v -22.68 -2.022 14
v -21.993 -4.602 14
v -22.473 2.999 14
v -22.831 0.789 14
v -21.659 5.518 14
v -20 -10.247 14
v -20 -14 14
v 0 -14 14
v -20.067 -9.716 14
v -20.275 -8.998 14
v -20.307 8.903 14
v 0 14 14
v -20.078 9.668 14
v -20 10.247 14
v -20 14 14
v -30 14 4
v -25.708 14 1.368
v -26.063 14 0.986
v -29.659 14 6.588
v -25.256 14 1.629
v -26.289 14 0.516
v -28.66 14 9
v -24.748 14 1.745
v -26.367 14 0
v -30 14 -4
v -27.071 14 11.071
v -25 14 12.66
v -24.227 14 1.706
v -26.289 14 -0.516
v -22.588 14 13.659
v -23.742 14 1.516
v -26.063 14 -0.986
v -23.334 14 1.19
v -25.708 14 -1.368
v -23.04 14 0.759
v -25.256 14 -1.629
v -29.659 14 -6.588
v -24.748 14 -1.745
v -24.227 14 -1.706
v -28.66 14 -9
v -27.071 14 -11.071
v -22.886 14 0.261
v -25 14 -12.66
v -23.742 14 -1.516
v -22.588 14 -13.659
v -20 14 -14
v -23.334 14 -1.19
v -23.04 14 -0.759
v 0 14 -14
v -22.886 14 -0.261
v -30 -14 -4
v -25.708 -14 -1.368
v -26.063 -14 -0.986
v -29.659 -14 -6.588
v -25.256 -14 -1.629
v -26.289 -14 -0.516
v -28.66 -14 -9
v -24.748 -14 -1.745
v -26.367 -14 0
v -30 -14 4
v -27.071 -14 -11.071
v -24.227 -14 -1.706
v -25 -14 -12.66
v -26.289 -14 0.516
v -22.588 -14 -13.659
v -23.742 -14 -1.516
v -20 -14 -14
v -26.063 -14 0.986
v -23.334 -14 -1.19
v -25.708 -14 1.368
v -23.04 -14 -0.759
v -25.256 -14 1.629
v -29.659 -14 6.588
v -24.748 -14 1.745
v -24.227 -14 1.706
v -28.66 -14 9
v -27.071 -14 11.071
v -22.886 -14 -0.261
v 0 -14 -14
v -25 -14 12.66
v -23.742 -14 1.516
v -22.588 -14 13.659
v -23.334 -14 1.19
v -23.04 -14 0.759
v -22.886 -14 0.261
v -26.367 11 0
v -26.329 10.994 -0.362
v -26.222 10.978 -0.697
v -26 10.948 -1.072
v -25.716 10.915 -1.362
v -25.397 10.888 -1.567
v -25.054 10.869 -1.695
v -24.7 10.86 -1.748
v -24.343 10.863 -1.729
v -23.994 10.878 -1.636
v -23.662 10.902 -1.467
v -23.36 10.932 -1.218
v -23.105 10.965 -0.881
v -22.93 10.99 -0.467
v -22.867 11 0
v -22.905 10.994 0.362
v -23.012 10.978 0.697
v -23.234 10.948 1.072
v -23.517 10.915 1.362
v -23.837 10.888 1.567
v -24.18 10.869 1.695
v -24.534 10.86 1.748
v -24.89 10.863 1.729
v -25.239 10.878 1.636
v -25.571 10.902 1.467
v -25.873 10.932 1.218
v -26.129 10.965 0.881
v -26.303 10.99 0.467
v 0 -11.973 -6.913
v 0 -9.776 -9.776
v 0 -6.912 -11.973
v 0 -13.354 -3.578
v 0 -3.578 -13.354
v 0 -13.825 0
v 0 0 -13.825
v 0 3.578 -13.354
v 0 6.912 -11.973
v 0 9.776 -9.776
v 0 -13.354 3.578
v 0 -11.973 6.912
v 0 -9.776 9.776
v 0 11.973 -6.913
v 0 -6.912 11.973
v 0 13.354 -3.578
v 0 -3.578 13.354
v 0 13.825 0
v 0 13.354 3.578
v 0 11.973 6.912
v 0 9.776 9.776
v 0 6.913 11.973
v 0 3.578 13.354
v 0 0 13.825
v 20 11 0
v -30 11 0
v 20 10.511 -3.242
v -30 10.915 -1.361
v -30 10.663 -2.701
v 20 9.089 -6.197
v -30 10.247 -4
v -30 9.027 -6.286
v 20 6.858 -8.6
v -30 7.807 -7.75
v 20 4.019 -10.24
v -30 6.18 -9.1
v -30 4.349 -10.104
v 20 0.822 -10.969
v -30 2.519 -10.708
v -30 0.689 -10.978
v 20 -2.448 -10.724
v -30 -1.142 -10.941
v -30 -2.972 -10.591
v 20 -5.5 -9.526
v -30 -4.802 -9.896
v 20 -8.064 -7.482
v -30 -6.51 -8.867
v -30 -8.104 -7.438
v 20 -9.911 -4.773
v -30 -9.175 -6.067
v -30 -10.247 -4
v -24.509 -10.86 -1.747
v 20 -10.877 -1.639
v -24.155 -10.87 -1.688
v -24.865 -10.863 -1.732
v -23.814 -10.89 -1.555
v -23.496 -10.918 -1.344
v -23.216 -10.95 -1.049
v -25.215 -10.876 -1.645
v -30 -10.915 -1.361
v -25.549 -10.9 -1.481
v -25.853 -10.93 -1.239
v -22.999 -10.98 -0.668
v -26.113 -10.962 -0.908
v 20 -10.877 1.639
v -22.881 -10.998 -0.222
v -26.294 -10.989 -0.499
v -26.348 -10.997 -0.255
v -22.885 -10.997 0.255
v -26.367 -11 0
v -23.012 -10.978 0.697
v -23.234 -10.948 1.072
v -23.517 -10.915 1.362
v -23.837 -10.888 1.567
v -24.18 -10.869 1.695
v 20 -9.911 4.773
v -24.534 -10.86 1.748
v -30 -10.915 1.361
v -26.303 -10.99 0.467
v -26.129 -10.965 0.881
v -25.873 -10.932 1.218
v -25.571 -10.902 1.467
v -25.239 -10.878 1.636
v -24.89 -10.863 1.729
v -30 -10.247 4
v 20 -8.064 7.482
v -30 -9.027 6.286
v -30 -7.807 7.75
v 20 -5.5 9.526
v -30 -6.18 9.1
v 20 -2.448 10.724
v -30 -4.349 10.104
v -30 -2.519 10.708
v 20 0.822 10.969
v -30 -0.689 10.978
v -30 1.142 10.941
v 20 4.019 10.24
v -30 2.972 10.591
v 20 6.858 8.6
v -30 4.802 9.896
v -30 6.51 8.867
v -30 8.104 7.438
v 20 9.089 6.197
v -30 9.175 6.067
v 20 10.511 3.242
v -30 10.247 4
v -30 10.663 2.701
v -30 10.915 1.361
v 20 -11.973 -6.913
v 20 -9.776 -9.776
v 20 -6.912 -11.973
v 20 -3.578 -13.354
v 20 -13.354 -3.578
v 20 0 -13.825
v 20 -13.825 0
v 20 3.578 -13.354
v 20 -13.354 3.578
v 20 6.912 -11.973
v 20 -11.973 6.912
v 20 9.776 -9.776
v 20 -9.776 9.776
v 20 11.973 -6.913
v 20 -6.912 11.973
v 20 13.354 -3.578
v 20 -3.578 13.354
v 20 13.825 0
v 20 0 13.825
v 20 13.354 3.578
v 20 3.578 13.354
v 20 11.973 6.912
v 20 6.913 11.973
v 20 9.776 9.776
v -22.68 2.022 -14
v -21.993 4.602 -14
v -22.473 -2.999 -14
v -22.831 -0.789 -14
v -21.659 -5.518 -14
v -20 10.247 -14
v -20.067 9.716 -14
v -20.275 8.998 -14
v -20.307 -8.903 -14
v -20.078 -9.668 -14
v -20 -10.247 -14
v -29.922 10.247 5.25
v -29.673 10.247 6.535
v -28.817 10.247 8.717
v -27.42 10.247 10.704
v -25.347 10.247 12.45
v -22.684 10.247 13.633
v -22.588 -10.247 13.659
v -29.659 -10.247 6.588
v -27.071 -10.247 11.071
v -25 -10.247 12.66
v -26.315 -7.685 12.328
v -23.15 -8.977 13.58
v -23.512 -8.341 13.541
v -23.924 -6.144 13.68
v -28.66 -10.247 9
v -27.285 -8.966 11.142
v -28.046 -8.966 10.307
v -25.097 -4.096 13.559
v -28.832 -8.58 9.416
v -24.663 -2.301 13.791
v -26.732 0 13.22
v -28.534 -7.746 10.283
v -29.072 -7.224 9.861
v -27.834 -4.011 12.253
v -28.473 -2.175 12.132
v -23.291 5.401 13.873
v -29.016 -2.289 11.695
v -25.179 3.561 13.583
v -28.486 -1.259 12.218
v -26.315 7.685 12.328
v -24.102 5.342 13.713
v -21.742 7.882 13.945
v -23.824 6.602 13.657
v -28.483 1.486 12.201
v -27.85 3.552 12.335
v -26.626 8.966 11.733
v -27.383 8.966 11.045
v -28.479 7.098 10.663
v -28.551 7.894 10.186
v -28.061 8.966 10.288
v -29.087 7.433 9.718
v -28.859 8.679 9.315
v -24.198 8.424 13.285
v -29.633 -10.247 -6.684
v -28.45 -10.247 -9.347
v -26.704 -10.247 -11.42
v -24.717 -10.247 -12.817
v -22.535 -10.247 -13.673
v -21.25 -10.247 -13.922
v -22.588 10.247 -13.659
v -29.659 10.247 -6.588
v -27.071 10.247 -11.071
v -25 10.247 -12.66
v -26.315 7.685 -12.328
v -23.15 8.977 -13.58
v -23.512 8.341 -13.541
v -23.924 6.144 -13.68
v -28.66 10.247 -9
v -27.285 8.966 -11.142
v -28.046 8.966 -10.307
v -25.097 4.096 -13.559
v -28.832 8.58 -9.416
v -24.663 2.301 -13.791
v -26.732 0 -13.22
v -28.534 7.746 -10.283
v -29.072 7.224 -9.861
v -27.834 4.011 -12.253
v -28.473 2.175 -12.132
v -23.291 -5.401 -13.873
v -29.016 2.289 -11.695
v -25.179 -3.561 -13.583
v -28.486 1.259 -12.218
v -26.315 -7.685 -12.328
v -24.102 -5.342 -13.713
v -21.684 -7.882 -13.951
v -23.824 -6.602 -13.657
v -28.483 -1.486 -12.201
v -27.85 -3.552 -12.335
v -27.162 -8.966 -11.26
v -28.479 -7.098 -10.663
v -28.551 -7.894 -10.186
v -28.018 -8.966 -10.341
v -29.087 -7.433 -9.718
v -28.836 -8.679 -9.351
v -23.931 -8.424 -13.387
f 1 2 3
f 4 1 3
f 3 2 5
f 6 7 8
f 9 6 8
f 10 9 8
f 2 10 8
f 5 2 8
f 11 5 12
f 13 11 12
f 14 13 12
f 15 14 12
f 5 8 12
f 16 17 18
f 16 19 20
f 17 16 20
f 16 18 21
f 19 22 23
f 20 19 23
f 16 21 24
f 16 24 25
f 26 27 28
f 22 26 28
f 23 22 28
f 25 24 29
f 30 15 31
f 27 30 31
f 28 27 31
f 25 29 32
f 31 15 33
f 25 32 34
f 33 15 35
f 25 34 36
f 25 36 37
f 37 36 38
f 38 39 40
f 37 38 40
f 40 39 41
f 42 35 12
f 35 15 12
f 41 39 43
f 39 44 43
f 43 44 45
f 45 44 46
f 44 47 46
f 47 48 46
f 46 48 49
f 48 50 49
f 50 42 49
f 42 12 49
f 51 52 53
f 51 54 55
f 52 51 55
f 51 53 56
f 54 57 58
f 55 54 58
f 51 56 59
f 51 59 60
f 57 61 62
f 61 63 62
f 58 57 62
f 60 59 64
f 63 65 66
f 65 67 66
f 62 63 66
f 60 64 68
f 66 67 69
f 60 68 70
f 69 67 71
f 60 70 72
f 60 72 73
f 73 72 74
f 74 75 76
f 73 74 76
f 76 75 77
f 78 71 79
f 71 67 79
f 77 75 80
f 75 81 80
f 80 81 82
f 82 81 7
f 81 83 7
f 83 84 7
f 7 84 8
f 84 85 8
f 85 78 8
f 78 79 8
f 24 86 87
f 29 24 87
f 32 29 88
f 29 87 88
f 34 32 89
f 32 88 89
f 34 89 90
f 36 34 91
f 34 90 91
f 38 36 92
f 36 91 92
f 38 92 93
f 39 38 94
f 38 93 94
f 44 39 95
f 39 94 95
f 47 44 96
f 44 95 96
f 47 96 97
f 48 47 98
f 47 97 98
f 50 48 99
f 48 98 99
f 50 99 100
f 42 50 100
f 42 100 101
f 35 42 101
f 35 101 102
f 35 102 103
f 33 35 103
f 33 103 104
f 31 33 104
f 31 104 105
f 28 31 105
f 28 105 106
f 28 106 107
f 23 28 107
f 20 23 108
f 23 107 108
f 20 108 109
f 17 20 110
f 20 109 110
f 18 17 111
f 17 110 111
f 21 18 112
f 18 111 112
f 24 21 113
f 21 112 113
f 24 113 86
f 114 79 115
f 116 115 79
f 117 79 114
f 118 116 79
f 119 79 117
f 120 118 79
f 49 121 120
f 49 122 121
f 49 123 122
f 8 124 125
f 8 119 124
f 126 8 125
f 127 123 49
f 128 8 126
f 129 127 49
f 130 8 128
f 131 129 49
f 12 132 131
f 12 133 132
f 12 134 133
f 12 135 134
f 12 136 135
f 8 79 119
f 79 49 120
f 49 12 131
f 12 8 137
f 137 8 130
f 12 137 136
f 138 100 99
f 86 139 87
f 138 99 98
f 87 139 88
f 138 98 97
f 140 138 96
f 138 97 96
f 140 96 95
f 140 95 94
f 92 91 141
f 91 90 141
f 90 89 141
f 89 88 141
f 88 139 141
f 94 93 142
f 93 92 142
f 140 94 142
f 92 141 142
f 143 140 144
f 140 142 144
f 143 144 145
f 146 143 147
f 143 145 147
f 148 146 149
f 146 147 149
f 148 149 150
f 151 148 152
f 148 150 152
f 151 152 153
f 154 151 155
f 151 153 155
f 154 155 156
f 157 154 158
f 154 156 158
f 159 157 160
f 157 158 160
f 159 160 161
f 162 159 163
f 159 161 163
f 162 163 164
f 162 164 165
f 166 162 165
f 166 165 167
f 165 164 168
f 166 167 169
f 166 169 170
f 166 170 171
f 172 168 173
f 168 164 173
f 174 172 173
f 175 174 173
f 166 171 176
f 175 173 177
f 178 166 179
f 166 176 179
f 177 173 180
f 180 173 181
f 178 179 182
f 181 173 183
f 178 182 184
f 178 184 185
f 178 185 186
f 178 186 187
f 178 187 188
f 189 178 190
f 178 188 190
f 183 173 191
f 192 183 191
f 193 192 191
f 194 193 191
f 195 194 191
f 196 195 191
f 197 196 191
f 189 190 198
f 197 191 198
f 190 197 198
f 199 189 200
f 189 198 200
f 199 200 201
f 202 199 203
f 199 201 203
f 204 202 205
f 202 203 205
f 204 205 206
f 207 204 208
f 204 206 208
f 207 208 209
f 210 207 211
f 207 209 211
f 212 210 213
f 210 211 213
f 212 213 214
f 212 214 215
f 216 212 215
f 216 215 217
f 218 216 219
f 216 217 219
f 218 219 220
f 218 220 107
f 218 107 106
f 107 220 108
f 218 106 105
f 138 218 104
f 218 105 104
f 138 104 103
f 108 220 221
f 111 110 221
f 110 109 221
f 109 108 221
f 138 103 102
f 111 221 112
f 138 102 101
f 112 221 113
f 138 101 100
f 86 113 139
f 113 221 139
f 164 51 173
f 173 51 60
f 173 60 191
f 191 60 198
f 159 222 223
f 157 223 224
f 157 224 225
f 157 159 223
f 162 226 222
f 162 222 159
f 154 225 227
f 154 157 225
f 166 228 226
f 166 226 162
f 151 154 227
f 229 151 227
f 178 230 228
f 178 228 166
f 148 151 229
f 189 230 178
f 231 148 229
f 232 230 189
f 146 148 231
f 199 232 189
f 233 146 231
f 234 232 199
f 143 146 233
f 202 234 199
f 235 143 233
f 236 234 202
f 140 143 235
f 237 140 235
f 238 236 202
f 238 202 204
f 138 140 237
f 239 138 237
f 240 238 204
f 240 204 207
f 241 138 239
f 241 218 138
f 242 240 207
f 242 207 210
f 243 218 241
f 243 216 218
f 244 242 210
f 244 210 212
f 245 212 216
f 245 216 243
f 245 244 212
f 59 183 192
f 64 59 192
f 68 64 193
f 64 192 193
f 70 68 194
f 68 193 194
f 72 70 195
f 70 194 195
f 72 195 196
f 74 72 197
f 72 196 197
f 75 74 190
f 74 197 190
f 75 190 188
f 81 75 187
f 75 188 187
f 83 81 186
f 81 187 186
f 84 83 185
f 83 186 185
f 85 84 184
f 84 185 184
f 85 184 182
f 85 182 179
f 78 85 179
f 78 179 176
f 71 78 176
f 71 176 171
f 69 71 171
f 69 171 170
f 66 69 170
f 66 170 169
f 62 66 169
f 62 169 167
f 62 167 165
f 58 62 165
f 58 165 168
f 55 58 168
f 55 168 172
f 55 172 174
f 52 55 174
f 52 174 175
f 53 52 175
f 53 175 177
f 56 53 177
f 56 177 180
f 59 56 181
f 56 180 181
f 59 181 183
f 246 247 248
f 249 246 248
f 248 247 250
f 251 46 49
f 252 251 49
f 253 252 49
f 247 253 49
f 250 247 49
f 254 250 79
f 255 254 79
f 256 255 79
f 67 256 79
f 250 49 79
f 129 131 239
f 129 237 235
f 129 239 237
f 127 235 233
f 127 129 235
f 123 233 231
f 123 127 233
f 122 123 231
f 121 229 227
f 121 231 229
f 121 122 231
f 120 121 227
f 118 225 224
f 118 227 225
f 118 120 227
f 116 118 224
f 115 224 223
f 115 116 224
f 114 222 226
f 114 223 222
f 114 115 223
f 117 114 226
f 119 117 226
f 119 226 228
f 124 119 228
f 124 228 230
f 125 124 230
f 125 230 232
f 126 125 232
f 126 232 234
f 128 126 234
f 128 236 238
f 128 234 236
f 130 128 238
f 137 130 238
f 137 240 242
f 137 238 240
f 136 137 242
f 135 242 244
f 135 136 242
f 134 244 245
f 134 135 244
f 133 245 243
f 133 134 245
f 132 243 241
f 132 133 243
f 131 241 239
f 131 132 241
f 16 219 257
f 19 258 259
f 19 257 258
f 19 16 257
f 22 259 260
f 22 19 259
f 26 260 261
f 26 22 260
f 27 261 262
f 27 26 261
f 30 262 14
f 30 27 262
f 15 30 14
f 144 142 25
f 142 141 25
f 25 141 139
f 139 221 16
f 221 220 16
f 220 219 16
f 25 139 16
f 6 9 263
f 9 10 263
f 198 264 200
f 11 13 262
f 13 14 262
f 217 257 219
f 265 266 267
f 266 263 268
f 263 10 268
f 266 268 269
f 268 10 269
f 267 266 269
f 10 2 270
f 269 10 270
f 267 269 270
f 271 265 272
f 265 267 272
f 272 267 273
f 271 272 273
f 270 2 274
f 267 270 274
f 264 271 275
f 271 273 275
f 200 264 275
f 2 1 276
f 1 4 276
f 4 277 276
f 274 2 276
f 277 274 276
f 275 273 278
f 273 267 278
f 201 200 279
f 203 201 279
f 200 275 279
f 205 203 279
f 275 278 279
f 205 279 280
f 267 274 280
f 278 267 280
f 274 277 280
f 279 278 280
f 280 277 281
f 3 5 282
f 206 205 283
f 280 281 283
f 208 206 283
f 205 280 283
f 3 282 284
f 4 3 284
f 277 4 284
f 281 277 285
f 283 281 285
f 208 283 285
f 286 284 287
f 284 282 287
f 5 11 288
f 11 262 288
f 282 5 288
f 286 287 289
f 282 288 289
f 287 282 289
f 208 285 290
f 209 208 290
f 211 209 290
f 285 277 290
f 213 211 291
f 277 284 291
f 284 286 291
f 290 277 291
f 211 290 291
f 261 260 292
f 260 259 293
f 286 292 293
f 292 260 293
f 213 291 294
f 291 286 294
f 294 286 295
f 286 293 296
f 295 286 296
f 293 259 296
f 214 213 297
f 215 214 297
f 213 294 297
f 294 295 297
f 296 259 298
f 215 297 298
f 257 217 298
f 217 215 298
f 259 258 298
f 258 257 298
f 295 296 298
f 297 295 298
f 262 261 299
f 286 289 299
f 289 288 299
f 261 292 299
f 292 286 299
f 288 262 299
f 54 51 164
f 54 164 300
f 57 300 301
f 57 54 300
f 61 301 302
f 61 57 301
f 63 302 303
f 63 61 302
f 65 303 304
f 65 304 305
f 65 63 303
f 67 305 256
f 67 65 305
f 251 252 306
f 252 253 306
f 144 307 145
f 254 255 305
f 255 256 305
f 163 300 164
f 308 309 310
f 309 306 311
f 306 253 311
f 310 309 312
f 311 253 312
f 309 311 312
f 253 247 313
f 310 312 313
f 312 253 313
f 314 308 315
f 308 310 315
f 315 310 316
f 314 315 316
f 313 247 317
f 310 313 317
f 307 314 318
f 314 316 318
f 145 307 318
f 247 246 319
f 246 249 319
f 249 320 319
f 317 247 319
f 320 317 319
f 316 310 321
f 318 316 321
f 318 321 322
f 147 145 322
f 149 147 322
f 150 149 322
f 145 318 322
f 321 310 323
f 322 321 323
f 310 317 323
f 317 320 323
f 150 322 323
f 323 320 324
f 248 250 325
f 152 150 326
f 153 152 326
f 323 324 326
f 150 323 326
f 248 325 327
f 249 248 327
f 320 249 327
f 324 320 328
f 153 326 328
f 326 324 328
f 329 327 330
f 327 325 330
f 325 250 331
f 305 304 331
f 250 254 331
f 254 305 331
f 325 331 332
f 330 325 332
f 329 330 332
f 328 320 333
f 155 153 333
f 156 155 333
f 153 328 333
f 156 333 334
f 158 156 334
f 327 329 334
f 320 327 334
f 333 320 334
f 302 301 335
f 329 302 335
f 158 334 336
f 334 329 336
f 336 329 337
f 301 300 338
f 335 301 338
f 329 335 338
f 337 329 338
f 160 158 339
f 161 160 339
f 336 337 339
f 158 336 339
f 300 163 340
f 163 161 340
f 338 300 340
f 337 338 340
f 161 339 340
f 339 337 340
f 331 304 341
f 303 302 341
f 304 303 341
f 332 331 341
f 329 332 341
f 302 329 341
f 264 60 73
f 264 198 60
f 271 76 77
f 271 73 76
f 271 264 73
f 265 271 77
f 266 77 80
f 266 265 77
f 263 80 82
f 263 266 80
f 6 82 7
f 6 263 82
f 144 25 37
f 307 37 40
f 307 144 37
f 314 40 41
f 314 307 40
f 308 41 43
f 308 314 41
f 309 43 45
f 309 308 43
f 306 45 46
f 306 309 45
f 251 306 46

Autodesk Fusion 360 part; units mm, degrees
sketch "Sketch6" plane through (0, 0, 0) normal (1, 0, 0) x (0, 1, 0)
  circle A0 centre (0, 0) radius 13.825
  circle A1 centre (0, 0) radius 11
  line L0 (-14, 14) -> (14, 14)
  line L1 (14, 14) -> (14, -14)
  line L2 (14, -14) -> (-14, -14)
  line L3 (-14, -14) -> (-14, 14)
  line L4 (-14, 14) -> (14, -14) construction
  line L5 (14, 14) -> (-14, -14) construction
  dimension "d41" = 27.65
  dimension "d42" = 22
extrude "Extrude8" add sketch "Sketch6" along normal blind 20 contours A0
extrude "Extrude9" add sketch "Sketch6" against normal blind 30 contours A0 | L0 L1 L2 L3
fillet "Fillet1" radius 10 1 edges at (-30, 0, 14)
fillet "Fillet2" radius 10 1 edges at (-30, 0, -14)
sketch "Sketch7" plane through (0, 14, 0) normal (0, 1, 0) x (-1, 0, 0)
  arc A0 (20, -14) -> (30, -4) centre (20, -4) ccw
  line L0 (30, -4) -> (30, 4)
  arc A1 (30, 4) -> (20, 14) centre (20, 4) ccw
  line L1 (20, 14) -> (0, 14)
  line L2 (0, 14) -> (0, -14)
  line L3 (0, -14) -> (20, -14)
  line L4 (0, 14) -> (27.0711, -11.0711) construction
  circle A2 centre (24.6168, 0) radius 1.75
  line L5 (0, -14) -> (27.0711, 11.0711) construction
  line L6 (15.1168, 0) -> (24.6168, 0) construction
  dimension "d51" = 3.5
  dimension "d55" = 9.5
extrude "Extrude10" cut sketch "Sketch7" along normal mid plane 42 from surface at -14 contours A2
